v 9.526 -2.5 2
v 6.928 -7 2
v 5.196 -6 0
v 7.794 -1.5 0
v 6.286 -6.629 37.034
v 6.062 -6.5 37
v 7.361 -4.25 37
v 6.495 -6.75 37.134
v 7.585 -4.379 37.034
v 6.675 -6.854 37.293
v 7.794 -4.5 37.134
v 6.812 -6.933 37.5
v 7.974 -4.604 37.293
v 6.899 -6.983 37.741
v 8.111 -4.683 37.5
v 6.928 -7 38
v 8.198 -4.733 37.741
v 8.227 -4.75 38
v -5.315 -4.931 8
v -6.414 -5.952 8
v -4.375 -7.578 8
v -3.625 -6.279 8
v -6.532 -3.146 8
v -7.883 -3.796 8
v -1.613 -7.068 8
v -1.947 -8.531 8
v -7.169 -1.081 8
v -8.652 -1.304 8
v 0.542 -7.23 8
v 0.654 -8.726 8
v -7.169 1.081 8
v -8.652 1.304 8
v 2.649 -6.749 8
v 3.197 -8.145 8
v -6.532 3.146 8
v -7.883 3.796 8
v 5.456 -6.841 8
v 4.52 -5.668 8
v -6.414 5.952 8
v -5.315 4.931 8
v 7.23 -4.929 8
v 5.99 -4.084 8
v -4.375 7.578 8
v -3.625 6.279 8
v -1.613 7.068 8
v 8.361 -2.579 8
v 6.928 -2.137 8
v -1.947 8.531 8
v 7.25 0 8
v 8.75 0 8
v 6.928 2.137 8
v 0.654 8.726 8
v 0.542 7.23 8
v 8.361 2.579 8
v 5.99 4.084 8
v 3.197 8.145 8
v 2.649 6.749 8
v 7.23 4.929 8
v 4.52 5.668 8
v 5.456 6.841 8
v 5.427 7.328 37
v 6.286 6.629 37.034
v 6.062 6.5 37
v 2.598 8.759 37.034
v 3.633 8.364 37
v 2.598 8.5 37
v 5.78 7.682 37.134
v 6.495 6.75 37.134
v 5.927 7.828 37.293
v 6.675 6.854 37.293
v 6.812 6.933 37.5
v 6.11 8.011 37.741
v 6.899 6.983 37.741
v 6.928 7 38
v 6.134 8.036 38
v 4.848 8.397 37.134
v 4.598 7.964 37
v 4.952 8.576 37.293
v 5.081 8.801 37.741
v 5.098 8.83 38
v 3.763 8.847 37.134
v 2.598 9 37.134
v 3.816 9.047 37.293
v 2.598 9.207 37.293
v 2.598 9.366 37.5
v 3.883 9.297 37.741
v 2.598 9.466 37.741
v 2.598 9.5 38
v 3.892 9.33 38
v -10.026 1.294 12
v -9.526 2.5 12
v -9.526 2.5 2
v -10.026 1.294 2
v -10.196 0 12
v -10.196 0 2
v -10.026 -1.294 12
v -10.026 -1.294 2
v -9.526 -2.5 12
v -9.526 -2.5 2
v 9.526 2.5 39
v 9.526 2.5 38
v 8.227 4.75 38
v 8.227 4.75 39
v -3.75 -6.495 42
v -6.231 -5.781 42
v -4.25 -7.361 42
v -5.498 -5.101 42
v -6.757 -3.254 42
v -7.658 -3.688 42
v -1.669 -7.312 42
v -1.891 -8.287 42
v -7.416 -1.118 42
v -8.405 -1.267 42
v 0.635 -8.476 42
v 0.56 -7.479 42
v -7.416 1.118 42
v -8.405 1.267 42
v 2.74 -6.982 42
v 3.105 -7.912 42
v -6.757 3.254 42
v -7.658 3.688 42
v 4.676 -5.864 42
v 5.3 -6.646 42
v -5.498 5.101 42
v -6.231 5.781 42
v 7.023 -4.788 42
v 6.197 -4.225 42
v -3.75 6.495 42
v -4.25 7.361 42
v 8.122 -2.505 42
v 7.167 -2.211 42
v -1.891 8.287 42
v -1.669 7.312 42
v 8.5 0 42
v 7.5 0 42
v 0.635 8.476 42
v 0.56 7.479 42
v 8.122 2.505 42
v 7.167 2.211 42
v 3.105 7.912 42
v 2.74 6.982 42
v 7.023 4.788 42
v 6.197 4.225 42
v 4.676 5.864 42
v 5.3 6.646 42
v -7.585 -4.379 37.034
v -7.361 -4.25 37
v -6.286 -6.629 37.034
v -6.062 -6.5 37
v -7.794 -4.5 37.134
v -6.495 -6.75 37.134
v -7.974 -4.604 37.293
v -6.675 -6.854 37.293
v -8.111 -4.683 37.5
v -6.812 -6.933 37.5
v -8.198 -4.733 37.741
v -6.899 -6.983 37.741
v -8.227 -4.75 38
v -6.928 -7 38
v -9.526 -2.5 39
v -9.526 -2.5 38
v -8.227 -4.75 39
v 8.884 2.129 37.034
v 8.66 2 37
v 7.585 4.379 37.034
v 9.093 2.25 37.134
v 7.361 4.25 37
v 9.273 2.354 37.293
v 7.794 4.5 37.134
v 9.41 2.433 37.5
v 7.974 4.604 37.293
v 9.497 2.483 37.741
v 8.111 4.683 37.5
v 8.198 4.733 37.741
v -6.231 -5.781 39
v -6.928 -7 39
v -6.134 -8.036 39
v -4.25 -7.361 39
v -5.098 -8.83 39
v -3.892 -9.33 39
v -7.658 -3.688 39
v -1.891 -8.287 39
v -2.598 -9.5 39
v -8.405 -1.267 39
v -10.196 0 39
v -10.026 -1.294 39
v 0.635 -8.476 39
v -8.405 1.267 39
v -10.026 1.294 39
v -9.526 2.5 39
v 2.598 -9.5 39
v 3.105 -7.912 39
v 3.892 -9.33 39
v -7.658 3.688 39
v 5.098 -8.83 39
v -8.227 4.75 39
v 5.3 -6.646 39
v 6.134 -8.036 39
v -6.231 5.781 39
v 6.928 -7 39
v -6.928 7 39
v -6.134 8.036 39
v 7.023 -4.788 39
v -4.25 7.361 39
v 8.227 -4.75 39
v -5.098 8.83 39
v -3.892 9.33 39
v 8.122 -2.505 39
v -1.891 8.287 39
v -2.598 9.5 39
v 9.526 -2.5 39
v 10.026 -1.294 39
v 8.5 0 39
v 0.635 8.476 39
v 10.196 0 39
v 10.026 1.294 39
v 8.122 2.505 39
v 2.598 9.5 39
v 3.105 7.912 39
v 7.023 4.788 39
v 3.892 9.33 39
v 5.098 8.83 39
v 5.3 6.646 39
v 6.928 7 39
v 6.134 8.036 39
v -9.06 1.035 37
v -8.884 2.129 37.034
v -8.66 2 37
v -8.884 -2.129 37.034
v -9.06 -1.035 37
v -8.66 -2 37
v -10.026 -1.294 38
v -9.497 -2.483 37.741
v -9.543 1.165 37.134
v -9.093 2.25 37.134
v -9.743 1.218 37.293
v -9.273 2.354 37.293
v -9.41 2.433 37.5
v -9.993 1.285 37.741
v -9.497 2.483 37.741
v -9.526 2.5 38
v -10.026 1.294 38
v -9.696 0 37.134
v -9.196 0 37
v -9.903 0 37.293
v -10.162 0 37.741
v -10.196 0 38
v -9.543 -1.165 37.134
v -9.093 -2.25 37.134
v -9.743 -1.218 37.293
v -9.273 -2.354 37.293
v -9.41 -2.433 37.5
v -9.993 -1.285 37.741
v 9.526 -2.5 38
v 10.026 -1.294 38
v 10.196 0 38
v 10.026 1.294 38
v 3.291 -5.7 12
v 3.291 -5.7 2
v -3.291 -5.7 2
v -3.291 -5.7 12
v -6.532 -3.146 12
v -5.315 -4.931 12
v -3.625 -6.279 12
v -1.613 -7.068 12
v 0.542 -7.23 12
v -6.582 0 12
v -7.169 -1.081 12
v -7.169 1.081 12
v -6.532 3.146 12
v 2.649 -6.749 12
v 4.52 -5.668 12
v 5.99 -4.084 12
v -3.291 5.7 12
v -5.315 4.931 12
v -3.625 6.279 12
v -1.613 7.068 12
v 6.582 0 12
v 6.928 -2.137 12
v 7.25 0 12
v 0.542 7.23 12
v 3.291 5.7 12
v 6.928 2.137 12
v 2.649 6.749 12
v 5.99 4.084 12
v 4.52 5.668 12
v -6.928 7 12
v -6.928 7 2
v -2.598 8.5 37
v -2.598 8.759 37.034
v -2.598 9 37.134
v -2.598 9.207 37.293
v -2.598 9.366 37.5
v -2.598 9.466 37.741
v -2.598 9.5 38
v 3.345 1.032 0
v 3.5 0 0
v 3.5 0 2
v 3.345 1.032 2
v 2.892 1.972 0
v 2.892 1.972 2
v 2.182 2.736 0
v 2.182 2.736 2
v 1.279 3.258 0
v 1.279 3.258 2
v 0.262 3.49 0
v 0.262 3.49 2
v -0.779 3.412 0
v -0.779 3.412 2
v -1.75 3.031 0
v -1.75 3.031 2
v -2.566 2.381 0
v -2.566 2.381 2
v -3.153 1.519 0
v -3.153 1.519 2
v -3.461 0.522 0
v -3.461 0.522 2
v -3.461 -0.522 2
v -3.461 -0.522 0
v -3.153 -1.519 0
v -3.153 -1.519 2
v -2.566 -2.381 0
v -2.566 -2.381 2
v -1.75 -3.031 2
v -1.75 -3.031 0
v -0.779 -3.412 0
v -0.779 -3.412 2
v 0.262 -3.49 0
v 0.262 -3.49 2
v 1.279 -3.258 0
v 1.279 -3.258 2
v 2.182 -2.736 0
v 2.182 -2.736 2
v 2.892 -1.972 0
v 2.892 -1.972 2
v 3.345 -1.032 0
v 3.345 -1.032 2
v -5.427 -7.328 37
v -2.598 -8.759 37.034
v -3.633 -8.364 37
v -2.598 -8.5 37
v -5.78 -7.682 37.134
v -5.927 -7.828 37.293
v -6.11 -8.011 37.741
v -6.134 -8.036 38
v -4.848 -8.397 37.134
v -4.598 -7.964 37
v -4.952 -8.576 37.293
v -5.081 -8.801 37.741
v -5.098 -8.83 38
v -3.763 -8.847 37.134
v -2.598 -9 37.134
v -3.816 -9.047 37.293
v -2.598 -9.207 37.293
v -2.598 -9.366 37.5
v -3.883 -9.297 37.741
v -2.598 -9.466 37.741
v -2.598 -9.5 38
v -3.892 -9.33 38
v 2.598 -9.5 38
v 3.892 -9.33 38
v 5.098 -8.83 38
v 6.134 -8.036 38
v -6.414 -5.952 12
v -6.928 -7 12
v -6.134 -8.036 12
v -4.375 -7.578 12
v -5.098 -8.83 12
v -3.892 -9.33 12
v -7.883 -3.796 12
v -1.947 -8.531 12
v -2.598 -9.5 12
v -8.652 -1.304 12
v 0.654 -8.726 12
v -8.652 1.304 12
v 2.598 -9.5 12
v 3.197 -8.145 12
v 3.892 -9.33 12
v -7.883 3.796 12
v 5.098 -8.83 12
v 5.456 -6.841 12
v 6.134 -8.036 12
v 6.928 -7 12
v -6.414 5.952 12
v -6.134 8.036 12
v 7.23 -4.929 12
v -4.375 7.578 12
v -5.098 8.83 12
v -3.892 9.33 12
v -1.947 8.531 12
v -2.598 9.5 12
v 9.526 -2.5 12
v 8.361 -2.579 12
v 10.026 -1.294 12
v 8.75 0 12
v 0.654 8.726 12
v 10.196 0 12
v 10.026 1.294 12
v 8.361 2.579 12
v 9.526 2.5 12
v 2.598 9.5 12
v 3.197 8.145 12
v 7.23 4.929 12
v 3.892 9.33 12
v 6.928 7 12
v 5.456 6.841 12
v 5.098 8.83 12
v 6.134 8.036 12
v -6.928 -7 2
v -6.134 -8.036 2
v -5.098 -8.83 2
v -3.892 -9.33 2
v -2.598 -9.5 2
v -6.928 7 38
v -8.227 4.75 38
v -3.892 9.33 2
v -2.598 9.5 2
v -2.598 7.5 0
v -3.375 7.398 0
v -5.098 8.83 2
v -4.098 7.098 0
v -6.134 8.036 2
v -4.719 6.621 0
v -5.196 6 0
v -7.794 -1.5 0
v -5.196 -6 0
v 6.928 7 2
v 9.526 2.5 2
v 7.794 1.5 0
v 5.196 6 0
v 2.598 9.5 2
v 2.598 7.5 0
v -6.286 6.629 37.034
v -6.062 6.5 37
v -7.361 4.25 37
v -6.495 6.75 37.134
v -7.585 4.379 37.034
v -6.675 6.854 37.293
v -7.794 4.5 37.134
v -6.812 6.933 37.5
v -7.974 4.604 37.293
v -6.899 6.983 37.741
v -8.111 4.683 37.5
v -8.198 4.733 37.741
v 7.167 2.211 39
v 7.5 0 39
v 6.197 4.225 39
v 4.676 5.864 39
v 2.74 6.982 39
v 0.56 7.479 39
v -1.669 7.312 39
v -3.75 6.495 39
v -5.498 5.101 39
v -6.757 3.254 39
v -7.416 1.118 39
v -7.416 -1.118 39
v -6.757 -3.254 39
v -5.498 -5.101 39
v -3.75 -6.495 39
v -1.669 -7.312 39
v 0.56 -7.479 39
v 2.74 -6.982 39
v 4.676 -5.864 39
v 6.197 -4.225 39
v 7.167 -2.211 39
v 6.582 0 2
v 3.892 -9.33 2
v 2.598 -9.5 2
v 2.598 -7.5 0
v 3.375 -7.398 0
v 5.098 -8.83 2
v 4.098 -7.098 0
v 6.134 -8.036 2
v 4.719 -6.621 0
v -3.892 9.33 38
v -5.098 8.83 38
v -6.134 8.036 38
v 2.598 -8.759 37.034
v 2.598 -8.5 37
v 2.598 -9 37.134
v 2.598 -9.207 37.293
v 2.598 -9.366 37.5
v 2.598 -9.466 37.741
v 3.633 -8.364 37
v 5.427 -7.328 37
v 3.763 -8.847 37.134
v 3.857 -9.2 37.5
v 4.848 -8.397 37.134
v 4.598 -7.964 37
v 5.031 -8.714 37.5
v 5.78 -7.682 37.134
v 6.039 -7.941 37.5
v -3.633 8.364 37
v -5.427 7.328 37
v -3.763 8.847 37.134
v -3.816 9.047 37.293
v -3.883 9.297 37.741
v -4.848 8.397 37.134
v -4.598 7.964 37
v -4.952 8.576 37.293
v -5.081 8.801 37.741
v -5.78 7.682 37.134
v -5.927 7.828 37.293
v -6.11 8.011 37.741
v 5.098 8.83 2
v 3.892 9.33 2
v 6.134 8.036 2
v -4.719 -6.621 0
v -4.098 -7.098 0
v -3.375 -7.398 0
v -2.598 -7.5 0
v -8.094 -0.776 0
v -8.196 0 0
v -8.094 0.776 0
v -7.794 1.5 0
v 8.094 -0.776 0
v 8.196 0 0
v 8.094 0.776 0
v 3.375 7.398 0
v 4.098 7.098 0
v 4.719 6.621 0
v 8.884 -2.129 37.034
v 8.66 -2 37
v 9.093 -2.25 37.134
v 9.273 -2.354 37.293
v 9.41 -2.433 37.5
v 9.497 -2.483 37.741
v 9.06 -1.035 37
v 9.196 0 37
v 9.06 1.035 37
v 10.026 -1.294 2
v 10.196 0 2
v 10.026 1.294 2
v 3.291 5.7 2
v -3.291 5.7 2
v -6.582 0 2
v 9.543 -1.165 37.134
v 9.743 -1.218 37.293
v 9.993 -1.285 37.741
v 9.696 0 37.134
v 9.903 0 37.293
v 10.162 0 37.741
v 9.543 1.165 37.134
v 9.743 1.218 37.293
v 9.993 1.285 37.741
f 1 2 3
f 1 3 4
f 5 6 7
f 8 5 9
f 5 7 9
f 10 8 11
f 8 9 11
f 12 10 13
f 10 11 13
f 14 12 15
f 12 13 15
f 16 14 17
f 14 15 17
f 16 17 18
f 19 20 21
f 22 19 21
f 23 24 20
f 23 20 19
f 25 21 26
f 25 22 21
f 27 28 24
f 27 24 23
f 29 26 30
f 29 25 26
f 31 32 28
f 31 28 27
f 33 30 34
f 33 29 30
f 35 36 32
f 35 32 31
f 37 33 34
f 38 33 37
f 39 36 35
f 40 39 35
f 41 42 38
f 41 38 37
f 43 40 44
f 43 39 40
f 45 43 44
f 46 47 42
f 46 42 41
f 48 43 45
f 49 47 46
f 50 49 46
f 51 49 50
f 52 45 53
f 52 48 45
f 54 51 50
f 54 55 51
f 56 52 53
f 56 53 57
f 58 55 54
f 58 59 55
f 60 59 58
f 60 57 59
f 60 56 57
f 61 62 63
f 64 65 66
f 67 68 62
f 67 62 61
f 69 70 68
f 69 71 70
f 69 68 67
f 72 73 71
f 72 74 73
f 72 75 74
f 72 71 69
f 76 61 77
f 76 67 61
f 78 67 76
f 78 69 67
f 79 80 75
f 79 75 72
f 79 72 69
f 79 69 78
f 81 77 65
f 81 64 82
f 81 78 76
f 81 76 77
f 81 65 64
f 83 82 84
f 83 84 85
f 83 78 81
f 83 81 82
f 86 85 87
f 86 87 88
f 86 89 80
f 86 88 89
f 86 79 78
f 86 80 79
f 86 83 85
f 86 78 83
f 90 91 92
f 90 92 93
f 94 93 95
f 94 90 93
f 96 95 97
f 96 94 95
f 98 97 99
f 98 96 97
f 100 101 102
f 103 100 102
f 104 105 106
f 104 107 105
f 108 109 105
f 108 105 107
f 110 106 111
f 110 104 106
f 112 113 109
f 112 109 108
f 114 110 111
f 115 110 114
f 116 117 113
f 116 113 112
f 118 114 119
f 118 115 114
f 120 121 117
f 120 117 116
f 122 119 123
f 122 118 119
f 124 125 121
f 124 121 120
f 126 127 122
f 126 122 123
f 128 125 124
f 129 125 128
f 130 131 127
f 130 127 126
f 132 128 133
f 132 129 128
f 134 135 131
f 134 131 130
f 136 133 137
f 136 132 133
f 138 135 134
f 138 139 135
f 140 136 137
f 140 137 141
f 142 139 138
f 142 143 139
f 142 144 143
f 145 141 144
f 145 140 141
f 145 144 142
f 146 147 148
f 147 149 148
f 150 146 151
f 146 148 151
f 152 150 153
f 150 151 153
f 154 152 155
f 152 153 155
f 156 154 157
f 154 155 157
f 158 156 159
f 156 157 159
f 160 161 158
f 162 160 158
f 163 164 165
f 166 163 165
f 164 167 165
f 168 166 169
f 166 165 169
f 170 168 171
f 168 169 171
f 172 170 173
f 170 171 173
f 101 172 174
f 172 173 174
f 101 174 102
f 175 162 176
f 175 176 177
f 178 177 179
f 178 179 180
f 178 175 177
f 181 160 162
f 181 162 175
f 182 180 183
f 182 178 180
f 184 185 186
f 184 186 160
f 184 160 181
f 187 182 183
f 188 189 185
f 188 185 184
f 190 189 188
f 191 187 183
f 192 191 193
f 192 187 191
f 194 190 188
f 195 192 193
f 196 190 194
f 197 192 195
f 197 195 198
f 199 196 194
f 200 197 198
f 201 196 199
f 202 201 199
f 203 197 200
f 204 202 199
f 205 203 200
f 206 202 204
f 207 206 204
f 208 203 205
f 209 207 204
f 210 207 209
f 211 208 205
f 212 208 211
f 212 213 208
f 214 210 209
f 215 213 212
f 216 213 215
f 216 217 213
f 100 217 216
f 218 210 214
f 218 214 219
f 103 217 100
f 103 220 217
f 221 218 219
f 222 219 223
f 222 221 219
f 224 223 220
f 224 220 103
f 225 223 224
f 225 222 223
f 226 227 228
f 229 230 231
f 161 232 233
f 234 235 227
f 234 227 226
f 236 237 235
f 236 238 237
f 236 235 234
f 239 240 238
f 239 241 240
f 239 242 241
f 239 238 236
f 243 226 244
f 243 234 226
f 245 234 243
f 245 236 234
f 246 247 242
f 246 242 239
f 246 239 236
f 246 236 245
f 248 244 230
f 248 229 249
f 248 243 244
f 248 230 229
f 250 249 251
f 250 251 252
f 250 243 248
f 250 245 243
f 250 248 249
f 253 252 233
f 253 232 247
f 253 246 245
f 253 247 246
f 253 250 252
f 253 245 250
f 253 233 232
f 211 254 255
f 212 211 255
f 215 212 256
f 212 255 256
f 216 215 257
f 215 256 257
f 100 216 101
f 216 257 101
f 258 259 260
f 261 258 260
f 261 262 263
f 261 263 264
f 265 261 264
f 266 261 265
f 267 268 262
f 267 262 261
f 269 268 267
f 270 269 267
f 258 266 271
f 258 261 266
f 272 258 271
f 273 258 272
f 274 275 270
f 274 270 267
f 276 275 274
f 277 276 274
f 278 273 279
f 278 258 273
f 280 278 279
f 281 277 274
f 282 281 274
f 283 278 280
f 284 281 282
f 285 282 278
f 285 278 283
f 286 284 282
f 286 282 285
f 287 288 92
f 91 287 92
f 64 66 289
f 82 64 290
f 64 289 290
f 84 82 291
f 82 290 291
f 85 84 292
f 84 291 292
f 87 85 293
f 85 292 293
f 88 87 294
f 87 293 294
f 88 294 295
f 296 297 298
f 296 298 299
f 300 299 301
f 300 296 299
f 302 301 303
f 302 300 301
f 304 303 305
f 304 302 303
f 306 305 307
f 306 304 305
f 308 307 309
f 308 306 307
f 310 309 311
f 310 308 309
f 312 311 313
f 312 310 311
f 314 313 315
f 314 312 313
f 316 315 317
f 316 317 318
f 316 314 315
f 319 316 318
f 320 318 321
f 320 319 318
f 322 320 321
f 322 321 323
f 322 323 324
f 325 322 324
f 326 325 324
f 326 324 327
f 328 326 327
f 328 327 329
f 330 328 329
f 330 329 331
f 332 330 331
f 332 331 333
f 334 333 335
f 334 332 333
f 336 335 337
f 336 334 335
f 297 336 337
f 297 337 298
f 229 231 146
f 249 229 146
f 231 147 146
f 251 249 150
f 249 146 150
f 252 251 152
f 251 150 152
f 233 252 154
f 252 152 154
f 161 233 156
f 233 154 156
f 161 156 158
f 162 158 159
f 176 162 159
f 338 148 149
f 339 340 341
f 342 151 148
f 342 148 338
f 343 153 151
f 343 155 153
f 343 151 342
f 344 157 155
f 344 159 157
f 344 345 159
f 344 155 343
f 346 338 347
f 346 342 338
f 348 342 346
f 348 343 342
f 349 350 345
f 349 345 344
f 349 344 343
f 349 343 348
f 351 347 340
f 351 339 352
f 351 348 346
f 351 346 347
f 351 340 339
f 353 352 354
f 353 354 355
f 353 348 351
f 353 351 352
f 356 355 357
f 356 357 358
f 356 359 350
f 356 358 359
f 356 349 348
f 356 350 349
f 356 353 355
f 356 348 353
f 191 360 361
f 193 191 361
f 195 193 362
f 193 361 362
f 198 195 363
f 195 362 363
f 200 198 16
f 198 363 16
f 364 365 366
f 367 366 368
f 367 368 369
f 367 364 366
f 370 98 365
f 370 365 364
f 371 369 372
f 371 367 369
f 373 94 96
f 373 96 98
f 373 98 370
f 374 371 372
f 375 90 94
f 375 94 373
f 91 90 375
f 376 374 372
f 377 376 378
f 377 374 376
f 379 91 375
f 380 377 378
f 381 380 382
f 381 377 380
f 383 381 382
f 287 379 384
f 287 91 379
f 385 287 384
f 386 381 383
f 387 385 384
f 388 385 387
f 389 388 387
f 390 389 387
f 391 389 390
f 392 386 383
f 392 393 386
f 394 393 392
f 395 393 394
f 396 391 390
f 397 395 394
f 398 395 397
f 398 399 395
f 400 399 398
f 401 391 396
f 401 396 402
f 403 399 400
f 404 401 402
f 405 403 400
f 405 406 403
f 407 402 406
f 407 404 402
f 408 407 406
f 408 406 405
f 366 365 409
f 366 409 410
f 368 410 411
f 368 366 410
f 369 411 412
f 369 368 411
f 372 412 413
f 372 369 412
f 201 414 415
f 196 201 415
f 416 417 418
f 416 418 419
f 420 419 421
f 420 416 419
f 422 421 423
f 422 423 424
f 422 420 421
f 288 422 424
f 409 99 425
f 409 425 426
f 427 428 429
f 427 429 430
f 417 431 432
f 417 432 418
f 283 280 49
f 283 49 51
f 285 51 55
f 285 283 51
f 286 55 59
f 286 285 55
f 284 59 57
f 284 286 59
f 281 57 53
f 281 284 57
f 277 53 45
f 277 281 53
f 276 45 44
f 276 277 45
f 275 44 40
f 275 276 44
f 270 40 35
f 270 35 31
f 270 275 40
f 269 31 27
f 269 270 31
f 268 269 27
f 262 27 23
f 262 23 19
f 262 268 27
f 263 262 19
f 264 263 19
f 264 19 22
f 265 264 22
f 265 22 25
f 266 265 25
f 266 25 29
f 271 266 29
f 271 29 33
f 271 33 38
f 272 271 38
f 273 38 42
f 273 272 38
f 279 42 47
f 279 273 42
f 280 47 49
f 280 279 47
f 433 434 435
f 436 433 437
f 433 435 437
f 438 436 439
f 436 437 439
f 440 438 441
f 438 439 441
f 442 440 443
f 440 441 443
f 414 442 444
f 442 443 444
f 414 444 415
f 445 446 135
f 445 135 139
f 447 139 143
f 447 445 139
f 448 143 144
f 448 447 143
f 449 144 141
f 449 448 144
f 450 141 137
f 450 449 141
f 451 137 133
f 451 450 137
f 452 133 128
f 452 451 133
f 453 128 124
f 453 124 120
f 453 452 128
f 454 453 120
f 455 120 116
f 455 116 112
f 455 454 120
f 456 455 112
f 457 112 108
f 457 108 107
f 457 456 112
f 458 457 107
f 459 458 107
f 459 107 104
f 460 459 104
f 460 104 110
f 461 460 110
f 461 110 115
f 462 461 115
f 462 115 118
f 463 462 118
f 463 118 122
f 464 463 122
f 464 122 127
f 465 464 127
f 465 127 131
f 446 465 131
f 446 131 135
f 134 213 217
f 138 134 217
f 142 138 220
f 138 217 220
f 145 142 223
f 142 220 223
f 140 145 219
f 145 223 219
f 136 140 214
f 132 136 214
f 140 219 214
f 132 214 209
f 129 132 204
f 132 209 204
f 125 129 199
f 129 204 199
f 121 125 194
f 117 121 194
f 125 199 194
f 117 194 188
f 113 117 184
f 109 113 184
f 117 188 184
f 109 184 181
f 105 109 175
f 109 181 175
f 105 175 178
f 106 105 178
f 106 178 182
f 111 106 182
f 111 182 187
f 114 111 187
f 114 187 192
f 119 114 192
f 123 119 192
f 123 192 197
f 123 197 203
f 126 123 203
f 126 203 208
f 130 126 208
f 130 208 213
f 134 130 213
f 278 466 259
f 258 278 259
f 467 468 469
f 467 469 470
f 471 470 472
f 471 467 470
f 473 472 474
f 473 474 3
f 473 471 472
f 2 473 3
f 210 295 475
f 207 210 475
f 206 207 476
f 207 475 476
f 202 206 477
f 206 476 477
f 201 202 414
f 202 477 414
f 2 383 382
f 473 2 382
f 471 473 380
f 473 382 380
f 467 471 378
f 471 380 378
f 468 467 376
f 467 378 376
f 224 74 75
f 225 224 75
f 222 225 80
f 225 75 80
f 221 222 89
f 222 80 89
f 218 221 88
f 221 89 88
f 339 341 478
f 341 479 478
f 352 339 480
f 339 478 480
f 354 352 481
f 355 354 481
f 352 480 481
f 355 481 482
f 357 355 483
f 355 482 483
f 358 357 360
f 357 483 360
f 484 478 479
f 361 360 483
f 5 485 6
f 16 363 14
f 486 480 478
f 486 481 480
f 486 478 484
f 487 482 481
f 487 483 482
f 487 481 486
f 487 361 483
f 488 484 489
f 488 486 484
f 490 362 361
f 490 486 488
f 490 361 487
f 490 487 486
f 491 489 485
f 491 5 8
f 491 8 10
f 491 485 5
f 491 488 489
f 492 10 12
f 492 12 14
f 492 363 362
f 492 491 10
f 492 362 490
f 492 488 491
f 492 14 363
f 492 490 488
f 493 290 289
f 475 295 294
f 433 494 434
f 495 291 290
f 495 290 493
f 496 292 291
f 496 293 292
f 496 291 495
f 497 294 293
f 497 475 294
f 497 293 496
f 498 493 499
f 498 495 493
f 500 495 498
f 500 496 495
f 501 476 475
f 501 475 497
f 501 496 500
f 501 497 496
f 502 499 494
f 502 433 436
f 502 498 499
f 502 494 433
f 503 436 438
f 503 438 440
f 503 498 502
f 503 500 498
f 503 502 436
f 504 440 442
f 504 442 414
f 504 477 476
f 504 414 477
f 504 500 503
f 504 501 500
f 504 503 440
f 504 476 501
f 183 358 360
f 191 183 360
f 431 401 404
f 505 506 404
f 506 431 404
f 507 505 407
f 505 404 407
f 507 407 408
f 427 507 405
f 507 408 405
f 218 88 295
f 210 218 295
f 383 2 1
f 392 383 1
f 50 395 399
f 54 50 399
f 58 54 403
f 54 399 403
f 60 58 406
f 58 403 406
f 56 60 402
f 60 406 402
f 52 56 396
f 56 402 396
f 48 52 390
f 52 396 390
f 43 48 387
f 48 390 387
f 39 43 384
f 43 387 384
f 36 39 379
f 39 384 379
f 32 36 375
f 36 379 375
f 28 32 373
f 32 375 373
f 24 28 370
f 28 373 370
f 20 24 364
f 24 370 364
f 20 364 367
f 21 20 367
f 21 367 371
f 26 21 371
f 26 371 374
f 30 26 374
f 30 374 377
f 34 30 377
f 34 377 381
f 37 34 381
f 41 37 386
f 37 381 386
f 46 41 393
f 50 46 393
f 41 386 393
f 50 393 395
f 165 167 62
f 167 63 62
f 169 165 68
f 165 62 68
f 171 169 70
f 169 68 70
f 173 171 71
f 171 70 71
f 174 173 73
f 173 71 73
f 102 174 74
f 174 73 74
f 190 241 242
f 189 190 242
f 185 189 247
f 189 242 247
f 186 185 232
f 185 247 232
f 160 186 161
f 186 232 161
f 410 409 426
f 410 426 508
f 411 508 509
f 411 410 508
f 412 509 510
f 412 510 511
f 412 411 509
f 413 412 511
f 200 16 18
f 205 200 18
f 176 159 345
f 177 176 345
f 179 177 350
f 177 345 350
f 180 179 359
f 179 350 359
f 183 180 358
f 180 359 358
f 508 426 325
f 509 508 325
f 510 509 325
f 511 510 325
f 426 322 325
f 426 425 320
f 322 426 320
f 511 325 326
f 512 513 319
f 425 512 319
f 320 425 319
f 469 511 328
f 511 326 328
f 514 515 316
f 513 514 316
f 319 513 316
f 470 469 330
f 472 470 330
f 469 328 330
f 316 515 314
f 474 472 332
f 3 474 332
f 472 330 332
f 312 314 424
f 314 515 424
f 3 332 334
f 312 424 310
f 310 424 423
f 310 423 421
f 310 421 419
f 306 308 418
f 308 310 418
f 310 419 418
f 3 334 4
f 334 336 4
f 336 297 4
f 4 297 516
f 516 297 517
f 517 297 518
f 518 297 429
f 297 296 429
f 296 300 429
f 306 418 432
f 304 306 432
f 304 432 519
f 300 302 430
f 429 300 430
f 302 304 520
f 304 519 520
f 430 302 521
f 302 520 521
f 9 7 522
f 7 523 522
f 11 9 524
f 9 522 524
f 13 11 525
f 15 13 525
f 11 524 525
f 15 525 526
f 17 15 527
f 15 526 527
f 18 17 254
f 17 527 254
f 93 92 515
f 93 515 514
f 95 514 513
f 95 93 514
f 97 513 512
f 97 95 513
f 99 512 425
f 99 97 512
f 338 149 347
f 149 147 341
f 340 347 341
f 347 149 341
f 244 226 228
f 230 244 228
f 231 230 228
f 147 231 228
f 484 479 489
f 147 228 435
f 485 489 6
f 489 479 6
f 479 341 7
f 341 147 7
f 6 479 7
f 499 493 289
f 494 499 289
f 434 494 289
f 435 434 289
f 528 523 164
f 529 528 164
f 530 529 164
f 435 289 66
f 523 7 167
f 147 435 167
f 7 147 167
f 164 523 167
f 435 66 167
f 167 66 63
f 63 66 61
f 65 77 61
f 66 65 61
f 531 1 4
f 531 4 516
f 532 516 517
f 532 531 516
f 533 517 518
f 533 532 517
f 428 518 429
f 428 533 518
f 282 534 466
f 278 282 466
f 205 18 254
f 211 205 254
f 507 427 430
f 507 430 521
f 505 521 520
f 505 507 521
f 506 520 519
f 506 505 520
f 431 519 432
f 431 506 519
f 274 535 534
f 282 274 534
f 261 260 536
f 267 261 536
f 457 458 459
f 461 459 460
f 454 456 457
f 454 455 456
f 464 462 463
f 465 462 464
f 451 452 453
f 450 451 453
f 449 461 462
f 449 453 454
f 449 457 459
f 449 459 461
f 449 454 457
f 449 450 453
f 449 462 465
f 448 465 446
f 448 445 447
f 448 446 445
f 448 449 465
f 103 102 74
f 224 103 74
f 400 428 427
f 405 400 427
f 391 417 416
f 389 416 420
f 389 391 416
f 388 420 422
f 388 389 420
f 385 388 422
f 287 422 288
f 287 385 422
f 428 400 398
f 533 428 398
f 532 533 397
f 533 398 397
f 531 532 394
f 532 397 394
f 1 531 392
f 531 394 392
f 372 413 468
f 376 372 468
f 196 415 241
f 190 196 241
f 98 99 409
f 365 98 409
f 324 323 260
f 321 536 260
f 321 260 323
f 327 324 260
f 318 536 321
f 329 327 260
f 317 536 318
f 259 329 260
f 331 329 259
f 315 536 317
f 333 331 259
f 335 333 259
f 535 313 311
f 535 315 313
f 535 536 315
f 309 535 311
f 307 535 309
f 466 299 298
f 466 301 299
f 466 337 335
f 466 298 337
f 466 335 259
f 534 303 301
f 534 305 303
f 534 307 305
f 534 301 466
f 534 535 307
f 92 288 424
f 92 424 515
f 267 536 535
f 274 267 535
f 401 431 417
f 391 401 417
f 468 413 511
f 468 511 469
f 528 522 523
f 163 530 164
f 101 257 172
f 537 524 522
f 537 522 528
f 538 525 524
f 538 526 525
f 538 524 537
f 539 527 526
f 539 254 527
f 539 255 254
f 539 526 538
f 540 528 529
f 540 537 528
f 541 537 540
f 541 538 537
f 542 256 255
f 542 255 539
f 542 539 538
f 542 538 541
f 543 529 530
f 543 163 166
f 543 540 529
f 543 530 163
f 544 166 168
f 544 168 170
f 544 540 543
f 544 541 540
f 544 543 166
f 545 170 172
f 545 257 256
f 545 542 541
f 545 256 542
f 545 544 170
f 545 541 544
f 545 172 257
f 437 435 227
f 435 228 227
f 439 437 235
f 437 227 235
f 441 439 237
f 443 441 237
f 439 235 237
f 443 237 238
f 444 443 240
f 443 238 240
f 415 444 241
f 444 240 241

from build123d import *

# Parameters (mm, degrees)
F1_DEPTH = 12
F0_R     = 3.5
F2_DEPTH = 2
F3_R     = 5
F4_R     = 8.75
F4_R_2   = 7.25
F5_DEPTH = 4
F7_R     = 8.5
F7_R_2   = 7.5
F8_DEPTH = 5
F9_DEPTH = 2
F10_R    = 1
F11_SIZE = 2


with BuildPart() as f1:
    # F0 (on Top) → F1 (new body)
    with BuildSketch(Plane.XY):
        Polygon((5.4848275573, 9.5), (-5.4848275573, 9.5), (-10.9696551146, 0), (-5.4848275573, -9.5), (5.4848275573, -9.5), (10.9696551146, 0), align=None)
        Polygon((3.2908965344, 5.7), (6.5817930688, 0), (3.2908965344, -5.7), (-3.2908965344, -5.7), (-6.5817930688, 0), (-3.2908965344, 5.7), align=None, mode=Mode.SUBTRACT)
    extrude(amount=F1_DEPTH)

    # F0 (on Top) → F2 (join)
    with BuildSketch(Plane.XY):
        Polygon((3.2908965344, -5.7), (6.5817930688, 0), (3.2908965344, 5.7), (-3.2908965344, 5.7), (-6.5817930688, 0), (-3.2908965344, -5.7), align=None)
        Circle(F0_R, mode=Mode.SUBTRACT)
    extrude(amount=F2_DEPTH)

    # F3
    f3_edges = [f1.edges().sort_by_distance(p)[0] for p in [
        (-5.484828, 9.5, 6),
        (-10.969655, 0, 6),
        (-5.484828, -9.5, 6),
        (5.484828, -9.5, 6),
        (10.969655, 0, 6),
        (5.484828, 9.5, 6),
    ]]
    fillet(f3_edges, radius=F3_R)

    # F4 (on face) → F5 (cut)
    with BuildSketch(Plane.XY.offset(12)):
        Circle(F4_R)
        Circle(F4_R_2, mode=Mode.SUBTRACT)
    extrude(amount=-F5_DEPTH, mode=Mode.SUBTRACT)

    # F11
    f11_edges = [f1.edges().sort_by_distance(p)[0] for p in [
        (0, 9.5, 0),
        (5.098076, 8.830127, 0),
    ]]
    chamfer(f11_edges, length=F11_SIZE)


with BuildPart() as f8:
    # F7 (on offset) → F8 (new body)
    with BuildSketch(Plane.XY.offset(37)):
        Circle(F7_R)
        Circle(F7_R_2, mode=Mode.SUBTRACT)
    extrude(amount=F8_DEPTH)

    # F7 (on offset) → F9 (join)
    with BuildSketch(Plane.XY.offset(37)):
        with BuildLine():
            ThreePointArc((8.2272414301, 4.749999837), (4.7500000815, 8.2272412889), (0, 9.5))
            ThreePointArc((0, 9.5), (-4.75, 8.227241336), (-8.227241336, 4.75))
            ThreePointArc((-8.227241336, 4.75), (-9.5, 9.41e-08), (-8.2272414301, -4.749999837))
            ThreePointArc((-8.2272414301, -4.749999837), (-4.7500000815, -8.2272412889), (0, -9.5))
            ThreePointArc((0, -9.5), (4.75, -8.227241336), (8.227241336, -4.75))
            ThreePointArc((8.227241336, -4.75), (9.1762953497, -2.4587809285), (9.5, 0))
            ThreePointArc((9.5, 0), (9.1762953741, 2.4587808376), (8.2272414301, 4.749999837))
        make_face()
        Circle(F7_R, mode=Mode.SUBTRACT)
        Circle(F7_R)
        Circle(F7_R_2, mode=Mode.SUBTRACT)
        Circle(F7_R_2)
        with BuildLine():
            Line((6.9282032303, -7), (8.227241336, -4.75))
            ThreePointArc((8.227241336, -4.75), (4.75, -8.227241336), (0, -9.5))
            Line((0, -9.5), (2.5980762114, -9.5))
            ThreePointArc((2.5980762114, -9.5), (5.0980762114, -8.8301270189), (6.9282032303, -7))
        make_face()
        with BuildLine():
            ThreePointArc((0, -9.5), (-4.7500000815, -8.2272412889), (-8.2272414301, -4.749999837))
            Line((-8.2272414301, -4.749999837), (-6.9282032303, -7))
            ThreePointArc((-6.9282032303, -7), (-5.0980762114, -8.8301270189), (-2.5980762114, -9.5))
            Line((-2.5980762114, -9.5), (0, -9.5))
        make_face()
        with BuildLine():
            ThreePointArc((-8.2272414301, -4.749999837), (-9.5, 9.41e-08), (-8.227241336, 4.75))
            Line((-8.227241336, 4.75), (-9.5262794416, 2.5))
            ThreePointArc((-9.5262794416, 2.5), (-10.1961524227, 0), (-9.5262794416, -2.5))
            Line((-9.5262794416, -2.5), (-8.2272414301, -4.749999837))
        make_face()
        with BuildLine():
            Line((0, 9.5), (-2.5980762114, 9.5))
            ThreePointArc((-2.5980762114, 9.5), (-5.0980762114, 8.8301270189), (-6.9282032303, 7))
            Line((-6.9282032303, 7), (-8.227241336, 4.75))
            ThreePointArc((-8.227241336, 4.75), (-4.75, 8.227241336), (0, 9.5))
        make_face()
        with BuildLine():
            Line((2.5980762114, 9.5), (0, 9.5))
            ThreePointArc((0, 9.5), (4.7500000815, 8.2272412889), (8.2272414301, 4.749999837))
            Line((8.2272414301, 4.749999837), (6.9282032303, 7))
            ThreePointArc((6.9282032303, 7), (5.0980762114, 8.8301270189), (2.5980762114, 9.5))
        make_face()
        with BuildLine():
            Line((9.5262794416, 2.5), (8.2272414301, 4.749999837))
            ThreePointArc((8.2272414301, 4.749999837), (9.1762953741, 2.4587808376), (9.5, 0))
            ThreePointArc((9.5, 0), (9.1762953497, -2.4587809285), (8.227241336, -4.75))
            Line((8.227241336, -4.75), (9.5262794416, -2.5))
            ThreePointArc((9.5262794416, -2.5), (10.1961524227, 0), (9.5262794416, 2.5))
        make_face()
    extrude(amount=F9_DEPTH)

    # F10
    f10_edges = [f8.edges().sort_by_distance(p)[0] for p in [
        (5.098076, -8.830127, 37),
        (8.227241, -4.75, 37),
        (10.196152, 0, 37),
        (8.227241, 4.75, 37),
        (5.098076, 8.830127, 37),
        (0, 9.5, 37),
        (-5.098076, 8.830127, 37),
        (-8.227241, 4.75, 37),
        (-10.196152, 0, 37),
        (-8.227241, -4.75, 37),
        (-5.098076, -8.830127, 37),
        (0, -9.5, 37),
    ]]
    fillet(f10_edges, radius=F10_R)


solid = Compound([f1.part, f8.part])
